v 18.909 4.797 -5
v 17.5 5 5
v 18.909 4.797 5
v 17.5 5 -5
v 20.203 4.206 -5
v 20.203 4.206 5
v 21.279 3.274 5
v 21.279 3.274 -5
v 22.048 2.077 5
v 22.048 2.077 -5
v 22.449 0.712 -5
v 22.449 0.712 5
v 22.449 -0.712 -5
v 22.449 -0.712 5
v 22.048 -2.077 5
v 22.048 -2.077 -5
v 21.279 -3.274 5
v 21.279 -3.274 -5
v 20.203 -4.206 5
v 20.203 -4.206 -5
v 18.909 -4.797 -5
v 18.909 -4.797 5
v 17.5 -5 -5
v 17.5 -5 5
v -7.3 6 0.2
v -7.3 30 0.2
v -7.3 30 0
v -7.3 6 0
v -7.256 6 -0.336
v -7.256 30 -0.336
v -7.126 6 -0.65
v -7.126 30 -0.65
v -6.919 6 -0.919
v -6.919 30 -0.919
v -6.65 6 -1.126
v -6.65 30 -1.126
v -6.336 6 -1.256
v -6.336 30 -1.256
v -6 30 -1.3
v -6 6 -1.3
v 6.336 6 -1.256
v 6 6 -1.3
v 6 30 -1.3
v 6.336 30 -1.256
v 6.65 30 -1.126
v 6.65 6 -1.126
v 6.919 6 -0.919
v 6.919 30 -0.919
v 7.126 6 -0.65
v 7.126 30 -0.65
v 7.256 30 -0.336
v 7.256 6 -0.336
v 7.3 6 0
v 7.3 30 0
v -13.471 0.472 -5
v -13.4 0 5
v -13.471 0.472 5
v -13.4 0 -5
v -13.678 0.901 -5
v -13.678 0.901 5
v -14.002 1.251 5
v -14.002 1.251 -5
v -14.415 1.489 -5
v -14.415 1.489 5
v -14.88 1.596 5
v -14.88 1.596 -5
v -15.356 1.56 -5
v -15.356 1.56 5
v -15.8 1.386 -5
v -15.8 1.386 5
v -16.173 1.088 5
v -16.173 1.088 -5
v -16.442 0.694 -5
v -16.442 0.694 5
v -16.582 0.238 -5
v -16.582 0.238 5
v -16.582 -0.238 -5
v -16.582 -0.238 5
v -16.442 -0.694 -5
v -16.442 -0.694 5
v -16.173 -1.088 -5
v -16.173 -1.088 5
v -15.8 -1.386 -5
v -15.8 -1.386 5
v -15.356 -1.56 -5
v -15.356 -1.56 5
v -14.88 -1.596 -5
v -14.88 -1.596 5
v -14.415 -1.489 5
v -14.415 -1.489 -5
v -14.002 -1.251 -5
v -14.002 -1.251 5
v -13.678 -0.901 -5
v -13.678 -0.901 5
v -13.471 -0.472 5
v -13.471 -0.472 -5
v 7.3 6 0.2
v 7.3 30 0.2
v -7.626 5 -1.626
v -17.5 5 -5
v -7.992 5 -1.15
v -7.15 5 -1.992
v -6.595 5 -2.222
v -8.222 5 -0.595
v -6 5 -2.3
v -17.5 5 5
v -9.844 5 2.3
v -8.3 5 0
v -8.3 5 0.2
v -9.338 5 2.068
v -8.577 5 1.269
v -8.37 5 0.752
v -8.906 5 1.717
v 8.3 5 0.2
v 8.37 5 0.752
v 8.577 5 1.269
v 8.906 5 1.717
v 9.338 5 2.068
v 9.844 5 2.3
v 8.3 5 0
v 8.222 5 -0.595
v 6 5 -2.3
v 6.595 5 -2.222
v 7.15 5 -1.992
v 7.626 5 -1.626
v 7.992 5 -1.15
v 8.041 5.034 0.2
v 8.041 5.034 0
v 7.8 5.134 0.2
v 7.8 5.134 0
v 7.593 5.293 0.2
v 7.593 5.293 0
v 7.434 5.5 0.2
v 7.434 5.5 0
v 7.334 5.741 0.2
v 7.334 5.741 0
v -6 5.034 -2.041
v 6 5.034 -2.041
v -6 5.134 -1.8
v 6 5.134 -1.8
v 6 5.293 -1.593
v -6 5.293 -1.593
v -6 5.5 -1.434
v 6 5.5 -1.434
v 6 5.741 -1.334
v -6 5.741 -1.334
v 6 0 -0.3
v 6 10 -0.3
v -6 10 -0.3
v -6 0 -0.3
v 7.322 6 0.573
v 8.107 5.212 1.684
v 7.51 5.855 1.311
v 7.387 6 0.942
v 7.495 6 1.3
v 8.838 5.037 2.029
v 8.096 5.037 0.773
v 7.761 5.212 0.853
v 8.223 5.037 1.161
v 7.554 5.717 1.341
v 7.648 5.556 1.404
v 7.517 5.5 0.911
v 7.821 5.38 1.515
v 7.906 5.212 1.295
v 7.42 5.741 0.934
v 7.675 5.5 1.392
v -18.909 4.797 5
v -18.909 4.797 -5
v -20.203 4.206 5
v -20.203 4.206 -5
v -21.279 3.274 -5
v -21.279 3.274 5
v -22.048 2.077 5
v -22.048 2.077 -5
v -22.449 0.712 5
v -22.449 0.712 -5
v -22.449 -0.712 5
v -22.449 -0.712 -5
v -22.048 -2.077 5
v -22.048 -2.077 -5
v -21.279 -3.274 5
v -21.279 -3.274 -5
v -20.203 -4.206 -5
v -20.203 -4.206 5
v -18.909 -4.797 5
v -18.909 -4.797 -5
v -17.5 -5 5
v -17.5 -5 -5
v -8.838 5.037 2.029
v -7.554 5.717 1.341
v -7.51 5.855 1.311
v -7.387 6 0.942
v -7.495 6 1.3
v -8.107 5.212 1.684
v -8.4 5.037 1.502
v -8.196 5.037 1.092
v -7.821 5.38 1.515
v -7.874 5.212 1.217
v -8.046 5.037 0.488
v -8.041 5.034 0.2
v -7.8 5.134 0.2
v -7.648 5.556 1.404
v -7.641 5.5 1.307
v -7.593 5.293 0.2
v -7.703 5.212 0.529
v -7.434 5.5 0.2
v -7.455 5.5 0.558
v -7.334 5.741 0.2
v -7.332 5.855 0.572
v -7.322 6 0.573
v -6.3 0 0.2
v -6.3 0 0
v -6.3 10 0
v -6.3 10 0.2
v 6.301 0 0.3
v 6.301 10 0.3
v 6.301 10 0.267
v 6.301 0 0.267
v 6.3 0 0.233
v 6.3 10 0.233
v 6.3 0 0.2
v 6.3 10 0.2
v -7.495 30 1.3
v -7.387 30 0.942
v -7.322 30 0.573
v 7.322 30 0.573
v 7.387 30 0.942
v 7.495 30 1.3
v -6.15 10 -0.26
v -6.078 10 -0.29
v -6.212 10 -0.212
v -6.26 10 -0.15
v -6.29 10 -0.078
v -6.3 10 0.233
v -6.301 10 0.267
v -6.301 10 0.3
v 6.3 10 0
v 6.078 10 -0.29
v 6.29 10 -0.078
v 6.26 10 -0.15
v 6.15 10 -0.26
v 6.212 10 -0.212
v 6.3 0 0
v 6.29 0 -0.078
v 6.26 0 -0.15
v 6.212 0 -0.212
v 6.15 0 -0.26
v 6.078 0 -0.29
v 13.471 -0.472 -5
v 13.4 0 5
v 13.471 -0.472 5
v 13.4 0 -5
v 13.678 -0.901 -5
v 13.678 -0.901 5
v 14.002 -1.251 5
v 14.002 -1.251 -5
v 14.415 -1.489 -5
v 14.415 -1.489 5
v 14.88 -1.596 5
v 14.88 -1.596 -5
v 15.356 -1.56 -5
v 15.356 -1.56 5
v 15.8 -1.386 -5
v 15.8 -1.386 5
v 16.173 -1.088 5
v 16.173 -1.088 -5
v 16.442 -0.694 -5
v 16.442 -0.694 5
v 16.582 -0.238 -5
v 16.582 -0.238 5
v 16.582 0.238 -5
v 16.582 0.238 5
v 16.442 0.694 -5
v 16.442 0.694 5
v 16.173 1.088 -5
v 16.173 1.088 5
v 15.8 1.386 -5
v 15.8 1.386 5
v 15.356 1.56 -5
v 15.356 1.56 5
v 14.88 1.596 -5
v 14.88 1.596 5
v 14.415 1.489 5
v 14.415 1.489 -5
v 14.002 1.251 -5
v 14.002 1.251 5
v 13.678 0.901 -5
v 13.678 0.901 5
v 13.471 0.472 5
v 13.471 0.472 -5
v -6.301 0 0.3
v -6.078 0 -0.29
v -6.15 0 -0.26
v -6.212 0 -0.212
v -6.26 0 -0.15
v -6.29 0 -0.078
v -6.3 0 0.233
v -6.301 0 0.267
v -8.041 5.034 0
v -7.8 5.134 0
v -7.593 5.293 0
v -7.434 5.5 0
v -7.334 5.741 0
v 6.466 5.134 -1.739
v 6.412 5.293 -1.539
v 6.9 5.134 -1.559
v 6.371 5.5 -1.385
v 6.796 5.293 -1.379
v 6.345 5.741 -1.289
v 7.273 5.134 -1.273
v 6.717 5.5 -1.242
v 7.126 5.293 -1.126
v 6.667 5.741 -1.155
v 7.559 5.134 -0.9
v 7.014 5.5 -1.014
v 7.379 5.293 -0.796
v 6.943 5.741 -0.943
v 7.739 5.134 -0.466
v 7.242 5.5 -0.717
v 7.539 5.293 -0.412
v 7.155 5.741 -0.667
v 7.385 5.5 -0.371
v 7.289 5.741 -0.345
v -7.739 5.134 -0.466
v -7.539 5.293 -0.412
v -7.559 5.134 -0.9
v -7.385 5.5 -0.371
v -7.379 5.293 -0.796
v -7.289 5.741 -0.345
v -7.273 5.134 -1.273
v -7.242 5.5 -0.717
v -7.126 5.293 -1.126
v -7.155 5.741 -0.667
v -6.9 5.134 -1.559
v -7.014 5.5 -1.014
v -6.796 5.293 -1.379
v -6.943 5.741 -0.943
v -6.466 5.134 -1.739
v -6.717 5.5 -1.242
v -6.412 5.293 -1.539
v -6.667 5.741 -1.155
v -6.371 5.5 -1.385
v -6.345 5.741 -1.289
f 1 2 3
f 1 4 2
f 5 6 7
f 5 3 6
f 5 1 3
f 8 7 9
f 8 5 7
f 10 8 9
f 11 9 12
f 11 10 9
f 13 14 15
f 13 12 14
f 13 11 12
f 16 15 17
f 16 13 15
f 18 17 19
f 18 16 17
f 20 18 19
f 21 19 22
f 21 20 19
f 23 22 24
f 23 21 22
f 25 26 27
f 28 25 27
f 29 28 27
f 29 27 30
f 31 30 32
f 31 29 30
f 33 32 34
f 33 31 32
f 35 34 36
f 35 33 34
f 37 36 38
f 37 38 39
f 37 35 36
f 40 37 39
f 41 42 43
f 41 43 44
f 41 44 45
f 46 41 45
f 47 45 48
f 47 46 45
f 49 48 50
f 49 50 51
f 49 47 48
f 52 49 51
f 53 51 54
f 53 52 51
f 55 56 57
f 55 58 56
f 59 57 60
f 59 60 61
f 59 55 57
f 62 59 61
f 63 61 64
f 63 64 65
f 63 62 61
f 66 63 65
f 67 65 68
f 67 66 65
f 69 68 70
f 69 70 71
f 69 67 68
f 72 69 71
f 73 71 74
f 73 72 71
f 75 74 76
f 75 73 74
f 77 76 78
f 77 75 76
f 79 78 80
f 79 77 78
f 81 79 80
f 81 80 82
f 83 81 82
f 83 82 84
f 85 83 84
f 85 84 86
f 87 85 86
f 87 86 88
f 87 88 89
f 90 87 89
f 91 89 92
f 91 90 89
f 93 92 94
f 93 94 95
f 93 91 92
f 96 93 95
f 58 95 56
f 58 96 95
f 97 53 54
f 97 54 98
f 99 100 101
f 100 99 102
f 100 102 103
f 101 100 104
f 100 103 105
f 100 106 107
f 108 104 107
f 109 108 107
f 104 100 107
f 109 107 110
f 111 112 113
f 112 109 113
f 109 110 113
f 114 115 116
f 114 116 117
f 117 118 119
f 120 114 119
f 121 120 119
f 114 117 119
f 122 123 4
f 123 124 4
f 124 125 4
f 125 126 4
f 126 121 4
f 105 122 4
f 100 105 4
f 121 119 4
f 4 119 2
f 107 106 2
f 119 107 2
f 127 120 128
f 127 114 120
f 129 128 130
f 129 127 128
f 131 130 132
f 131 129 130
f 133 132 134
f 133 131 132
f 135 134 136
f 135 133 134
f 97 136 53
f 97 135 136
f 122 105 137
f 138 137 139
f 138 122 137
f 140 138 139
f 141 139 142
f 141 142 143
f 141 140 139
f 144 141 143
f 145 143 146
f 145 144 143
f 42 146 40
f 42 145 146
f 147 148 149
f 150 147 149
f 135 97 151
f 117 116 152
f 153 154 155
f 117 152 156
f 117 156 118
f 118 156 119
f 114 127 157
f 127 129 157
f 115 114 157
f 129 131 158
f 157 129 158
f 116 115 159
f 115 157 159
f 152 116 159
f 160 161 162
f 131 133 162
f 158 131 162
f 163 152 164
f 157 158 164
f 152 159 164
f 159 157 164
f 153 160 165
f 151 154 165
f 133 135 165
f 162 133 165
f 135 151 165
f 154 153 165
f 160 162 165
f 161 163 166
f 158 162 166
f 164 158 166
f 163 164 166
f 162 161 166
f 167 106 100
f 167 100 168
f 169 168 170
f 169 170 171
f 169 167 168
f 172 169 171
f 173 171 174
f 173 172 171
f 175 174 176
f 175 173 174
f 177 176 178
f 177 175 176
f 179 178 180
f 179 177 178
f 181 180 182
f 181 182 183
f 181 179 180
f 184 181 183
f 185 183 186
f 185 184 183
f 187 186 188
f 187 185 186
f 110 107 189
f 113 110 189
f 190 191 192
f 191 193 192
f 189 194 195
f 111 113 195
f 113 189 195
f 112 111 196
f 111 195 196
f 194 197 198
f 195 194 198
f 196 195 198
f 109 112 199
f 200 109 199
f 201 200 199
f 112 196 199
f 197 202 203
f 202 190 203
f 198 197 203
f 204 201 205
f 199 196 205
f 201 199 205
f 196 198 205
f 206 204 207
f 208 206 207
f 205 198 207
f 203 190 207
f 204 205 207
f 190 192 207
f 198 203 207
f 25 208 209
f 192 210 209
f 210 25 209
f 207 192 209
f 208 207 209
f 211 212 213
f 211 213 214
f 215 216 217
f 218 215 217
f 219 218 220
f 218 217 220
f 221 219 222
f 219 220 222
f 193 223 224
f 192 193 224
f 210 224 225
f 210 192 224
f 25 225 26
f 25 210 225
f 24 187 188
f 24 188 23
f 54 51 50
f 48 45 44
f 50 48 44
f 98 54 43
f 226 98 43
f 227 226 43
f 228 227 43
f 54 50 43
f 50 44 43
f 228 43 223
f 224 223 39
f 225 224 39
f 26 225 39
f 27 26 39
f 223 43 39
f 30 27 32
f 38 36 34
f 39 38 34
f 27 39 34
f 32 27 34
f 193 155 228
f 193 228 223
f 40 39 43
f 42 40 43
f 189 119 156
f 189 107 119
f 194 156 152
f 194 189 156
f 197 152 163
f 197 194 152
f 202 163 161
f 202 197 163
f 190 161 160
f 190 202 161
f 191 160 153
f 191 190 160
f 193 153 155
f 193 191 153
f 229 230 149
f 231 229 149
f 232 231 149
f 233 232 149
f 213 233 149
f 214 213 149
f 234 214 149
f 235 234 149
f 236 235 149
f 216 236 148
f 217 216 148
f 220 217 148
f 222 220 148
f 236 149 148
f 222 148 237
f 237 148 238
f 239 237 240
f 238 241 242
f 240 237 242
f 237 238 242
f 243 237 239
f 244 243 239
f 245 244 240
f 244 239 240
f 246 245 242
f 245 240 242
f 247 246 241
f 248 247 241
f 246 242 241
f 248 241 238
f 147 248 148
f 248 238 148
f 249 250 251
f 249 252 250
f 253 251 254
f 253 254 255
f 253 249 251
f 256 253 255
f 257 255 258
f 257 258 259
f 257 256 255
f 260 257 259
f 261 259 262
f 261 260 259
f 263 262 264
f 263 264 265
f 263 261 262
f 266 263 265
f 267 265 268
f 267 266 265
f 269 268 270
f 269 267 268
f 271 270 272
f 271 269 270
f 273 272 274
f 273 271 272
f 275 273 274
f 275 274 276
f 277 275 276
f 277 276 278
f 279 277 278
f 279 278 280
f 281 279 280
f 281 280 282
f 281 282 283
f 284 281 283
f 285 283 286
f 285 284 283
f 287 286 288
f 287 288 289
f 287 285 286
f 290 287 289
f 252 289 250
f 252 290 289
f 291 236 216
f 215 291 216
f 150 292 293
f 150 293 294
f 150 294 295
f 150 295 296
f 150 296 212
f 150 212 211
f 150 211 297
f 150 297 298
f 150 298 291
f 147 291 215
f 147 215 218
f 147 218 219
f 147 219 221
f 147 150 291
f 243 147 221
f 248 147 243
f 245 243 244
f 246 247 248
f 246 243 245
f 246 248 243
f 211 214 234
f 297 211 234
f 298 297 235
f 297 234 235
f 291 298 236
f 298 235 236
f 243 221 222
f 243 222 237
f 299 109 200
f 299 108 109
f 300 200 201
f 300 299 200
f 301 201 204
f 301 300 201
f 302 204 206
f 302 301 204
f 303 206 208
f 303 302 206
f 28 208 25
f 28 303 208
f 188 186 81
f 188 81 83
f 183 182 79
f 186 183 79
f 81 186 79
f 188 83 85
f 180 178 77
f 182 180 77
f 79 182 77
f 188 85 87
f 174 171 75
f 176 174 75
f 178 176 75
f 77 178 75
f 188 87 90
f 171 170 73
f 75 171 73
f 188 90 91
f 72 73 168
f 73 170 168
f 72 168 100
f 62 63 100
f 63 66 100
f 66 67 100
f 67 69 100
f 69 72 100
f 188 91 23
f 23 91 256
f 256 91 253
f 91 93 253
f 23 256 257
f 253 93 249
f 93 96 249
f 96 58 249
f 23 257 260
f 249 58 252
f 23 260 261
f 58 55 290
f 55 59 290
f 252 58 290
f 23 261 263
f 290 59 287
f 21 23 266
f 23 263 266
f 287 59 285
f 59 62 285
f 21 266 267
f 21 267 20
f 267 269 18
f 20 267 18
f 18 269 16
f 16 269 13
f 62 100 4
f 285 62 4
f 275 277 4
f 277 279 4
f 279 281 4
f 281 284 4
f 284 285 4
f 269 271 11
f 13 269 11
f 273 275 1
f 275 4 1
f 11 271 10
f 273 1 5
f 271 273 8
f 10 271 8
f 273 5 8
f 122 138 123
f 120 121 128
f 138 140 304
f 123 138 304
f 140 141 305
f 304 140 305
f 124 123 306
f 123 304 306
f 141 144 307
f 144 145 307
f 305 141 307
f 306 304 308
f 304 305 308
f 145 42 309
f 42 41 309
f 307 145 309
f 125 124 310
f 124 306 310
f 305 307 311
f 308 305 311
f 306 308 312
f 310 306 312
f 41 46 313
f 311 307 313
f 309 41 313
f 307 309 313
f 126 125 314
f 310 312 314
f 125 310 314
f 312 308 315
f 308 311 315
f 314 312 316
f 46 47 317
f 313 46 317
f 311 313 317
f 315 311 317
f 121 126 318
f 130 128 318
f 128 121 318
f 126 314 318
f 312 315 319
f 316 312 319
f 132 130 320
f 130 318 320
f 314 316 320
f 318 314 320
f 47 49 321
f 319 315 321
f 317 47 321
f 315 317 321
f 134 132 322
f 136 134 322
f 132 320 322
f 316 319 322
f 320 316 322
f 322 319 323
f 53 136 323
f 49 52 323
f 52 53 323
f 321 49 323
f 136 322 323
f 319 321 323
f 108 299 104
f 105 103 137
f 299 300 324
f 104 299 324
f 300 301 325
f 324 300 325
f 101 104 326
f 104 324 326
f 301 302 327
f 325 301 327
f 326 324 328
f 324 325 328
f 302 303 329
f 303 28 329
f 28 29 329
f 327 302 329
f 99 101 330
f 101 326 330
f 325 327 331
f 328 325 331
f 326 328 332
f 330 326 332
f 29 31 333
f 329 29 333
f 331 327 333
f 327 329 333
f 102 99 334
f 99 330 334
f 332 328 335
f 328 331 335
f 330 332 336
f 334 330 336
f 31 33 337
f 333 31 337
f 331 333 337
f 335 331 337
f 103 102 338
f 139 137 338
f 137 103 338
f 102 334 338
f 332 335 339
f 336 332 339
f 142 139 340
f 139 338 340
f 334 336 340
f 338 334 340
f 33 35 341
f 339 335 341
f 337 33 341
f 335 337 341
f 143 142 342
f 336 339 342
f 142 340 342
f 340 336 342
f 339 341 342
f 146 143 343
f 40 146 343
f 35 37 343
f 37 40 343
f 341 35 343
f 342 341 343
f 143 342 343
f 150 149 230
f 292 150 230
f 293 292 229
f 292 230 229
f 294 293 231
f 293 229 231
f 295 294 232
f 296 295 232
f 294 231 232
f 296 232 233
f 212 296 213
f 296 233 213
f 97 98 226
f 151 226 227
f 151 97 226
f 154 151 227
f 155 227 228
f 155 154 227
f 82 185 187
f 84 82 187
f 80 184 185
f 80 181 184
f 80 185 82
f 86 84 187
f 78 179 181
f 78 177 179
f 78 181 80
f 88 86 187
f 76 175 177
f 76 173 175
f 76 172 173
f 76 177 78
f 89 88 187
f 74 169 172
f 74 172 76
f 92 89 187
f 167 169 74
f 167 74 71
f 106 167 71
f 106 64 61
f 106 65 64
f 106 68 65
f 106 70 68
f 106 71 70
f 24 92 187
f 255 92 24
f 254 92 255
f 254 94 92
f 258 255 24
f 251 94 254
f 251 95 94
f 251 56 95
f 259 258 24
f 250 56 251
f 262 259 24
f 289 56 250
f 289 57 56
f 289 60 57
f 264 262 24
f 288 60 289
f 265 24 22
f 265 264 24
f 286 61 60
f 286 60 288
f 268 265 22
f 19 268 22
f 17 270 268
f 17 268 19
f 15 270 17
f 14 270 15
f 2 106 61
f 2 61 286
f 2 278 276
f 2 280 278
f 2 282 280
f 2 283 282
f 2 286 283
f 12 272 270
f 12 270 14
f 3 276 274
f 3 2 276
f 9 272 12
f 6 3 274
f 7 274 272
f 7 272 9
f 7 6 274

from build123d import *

# Parameters (mm, degrees)
SKETCH_1_W          = 45
SKETCH_1_H          = 10
SKETCH_1_R          = 1.6
EXTRUDE_1_DEPTH     = 5
FILLET_1_RADIUS     = 5
FILLET_1_LENGTH     = 10
FILLET_2_RADIUS     = 5
FILLET_2_LENGTH     = 10
EXTRUDE_2_DEPTH     = 25
FILLET_8_R          = 1
CUT_EXTRUDE_START   = -20
CUT_EXTRUDE_1_DEPTH = 10


with BuildPart() as part:
    # Эскиз1 → Бобышка-Вытянуть1 (new, symmetric)
    with BuildSketch(Plane.XY):
        Rectangle(SKETCH_1_W, SKETCH_1_H)
        with Locations((-15, 0)):
            Circle(SKETCH_1_R, mode=Mode.SUBTRACT)
        with Locations(Location((15, 0, 0), (0, 0, 180))):
            Circle(SKETCH_1_R, mode=Mode.SUBTRACT)
    extrude(amount=EXTRUDE_1_DEPTH, both=True)

    # Скругление1: full round fillet: the end face becomes a half cylinder, R = half its width
    fillet_1_face = Plane((-22.5, 0, 0), x_dir=(0, 0, 1), z_dir=(-1, 0, 0))  # on the end face: x along it, z out of the body
    fillet_1_slab = fillet_1_face.offset(-FILLET_1_RADIUS / 2) * Box(FILLET_1_LENGTH, 2 * FILLET_1_RADIUS, FILLET_1_RADIUS, mode=Mode.PRIVATE)  # the body's end, R deep
    fillet_1_round = Plane((-17.5, 0, 0), x_dir=(-1, 0, 0), z_dir=(0, 0, 1)) * Cylinder(FILLET_1_RADIUS, FILLET_1_LENGTH, mode=Mode.PRIVATE)  # its axis R under the face
    add(fillet_1_slab - fillet_1_round, mode=Mode.SUBTRACT)

    # Скругление2: full round fillet: the end face becomes a half cylinder, R = half its width
    fillet_2_face = Plane((22.5, 0, 0), x_dir=(0, 0, -1), z_dir=(1, 0, 0))  # on the end face: x along it, z out of the body
    fillet_2_slab = fillet_2_face.offset(-FILLET_2_RADIUS / 2) * Box(FILLET_2_LENGTH, 2 * FILLET_2_RADIUS, FILLET_2_RADIUS, mode=Mode.PRIVATE)  # the body's end, R deep
    fillet_2_round = Plane((17.5, 0, 0), x_dir=(1, 0, 0), z_dir=(0, 0, -1)) * Cylinder(FILLET_2_RADIUS, FILLET_2_LENGTH, mode=Mode.PRIVATE)  # its axis R under the face
    add(fillet_2_slab - fillet_2_round, mode=Mode.SUBTRACT)

    # Эскиз2 → Бобышка-Вытянуть2 (add)
    with BuildSketch(Plane(origin=(0, 5, 0), x_dir=(1, 0, 0), z_dir=(0, 1, 0))):
        with BuildLine():
            Line((-6, 1.3), (6, 1.3))
            ThreePointArc((6, 1.3), (6.919238816, 0.919238816), (7.3, 0))
            Line((7.3, 0), (7.3, -0.2))
            ThreePointArc((7.3, -0.2), (7.349128161, -0.758575559), (7.49500416, -1.3))
            Line((7.49500416, -1.3), (-7.49500416, -1.3))
            ThreePointArc((-7.49500416, -1.3), (-7.349128161, -0.758575559), (-7.3, -0.2))
            Line((-7.3, -0.2), (-7.3, 0))
            ThreePointArc((-7.3, 0), (-6.919238816, 0.919238816), (-6, 1.3))
        make_face()
    extrude(amount=EXTRUDE_2_DEPTH)

    # Скругление8
    fillet_8_edges = [part.edges().sort_by_distance(p)[0] for p in [
        (0, 5, 1.3),
    ]]
    fillet(fillet_8_edges, radius=FILLET_8_R)
    fillet_8_2_edges = [part.edges().sort_by_distance(p)[0] for p in [
        (-7.349128161, 5, 0.758575559),
        (7.349128161, 5, 0.758575559),
        (7.3, 5, 0.1),
        (6.919238816, 5, -0.919238816),
        (0, 5, -1.3),
        (-6.919238816, 5, -0.919238816),
        (-7.3, 5, 0.1),
    ]]
    fillet(fillet_8_2_edges, radius=FILLET_8_R - 0.0001)  # a hair under: the kernel refuses the full size

    # Эскиз3 → Вырез-Вытянуть1 (cut)
    with BuildSketch(Plane(origin=(0, 30, 0), x_dir=(1, 0, 0), z_dir=(0, 1, 0)).offset(CUT_EXTRUDE_START)):
        with BuildLine():
            Line((6.3, -0.2), (6.3, 0))
            ThreePointArc((6.3, 0), (6.212132034, 0.212132034), (6, 0.3))
            Line((6, 0.3), (-6, 0.3))
            ThreePointArc((-6, 0.3), (-6.212132034, 0.212132034), (-6.3, 0))
            Line((-6.3, 0), (-6.3, -0.2))
            ThreePointArc((-6.3, -0.2), (-6.300297672, -0.250003544), (-6.301190645, -0.3))
            Line((-6.301190645, -0.3), (6.301190645, -0.3))
            ThreePointArc((6.301190645, -0.3), (6.300297672, -0.250003544), (6.3, -0.2))
        make_face()
    extrude(amount=-CUT_EXTRUDE_1_DEPTH, mode=Mode.SUBTRACT)


solid = part.part
